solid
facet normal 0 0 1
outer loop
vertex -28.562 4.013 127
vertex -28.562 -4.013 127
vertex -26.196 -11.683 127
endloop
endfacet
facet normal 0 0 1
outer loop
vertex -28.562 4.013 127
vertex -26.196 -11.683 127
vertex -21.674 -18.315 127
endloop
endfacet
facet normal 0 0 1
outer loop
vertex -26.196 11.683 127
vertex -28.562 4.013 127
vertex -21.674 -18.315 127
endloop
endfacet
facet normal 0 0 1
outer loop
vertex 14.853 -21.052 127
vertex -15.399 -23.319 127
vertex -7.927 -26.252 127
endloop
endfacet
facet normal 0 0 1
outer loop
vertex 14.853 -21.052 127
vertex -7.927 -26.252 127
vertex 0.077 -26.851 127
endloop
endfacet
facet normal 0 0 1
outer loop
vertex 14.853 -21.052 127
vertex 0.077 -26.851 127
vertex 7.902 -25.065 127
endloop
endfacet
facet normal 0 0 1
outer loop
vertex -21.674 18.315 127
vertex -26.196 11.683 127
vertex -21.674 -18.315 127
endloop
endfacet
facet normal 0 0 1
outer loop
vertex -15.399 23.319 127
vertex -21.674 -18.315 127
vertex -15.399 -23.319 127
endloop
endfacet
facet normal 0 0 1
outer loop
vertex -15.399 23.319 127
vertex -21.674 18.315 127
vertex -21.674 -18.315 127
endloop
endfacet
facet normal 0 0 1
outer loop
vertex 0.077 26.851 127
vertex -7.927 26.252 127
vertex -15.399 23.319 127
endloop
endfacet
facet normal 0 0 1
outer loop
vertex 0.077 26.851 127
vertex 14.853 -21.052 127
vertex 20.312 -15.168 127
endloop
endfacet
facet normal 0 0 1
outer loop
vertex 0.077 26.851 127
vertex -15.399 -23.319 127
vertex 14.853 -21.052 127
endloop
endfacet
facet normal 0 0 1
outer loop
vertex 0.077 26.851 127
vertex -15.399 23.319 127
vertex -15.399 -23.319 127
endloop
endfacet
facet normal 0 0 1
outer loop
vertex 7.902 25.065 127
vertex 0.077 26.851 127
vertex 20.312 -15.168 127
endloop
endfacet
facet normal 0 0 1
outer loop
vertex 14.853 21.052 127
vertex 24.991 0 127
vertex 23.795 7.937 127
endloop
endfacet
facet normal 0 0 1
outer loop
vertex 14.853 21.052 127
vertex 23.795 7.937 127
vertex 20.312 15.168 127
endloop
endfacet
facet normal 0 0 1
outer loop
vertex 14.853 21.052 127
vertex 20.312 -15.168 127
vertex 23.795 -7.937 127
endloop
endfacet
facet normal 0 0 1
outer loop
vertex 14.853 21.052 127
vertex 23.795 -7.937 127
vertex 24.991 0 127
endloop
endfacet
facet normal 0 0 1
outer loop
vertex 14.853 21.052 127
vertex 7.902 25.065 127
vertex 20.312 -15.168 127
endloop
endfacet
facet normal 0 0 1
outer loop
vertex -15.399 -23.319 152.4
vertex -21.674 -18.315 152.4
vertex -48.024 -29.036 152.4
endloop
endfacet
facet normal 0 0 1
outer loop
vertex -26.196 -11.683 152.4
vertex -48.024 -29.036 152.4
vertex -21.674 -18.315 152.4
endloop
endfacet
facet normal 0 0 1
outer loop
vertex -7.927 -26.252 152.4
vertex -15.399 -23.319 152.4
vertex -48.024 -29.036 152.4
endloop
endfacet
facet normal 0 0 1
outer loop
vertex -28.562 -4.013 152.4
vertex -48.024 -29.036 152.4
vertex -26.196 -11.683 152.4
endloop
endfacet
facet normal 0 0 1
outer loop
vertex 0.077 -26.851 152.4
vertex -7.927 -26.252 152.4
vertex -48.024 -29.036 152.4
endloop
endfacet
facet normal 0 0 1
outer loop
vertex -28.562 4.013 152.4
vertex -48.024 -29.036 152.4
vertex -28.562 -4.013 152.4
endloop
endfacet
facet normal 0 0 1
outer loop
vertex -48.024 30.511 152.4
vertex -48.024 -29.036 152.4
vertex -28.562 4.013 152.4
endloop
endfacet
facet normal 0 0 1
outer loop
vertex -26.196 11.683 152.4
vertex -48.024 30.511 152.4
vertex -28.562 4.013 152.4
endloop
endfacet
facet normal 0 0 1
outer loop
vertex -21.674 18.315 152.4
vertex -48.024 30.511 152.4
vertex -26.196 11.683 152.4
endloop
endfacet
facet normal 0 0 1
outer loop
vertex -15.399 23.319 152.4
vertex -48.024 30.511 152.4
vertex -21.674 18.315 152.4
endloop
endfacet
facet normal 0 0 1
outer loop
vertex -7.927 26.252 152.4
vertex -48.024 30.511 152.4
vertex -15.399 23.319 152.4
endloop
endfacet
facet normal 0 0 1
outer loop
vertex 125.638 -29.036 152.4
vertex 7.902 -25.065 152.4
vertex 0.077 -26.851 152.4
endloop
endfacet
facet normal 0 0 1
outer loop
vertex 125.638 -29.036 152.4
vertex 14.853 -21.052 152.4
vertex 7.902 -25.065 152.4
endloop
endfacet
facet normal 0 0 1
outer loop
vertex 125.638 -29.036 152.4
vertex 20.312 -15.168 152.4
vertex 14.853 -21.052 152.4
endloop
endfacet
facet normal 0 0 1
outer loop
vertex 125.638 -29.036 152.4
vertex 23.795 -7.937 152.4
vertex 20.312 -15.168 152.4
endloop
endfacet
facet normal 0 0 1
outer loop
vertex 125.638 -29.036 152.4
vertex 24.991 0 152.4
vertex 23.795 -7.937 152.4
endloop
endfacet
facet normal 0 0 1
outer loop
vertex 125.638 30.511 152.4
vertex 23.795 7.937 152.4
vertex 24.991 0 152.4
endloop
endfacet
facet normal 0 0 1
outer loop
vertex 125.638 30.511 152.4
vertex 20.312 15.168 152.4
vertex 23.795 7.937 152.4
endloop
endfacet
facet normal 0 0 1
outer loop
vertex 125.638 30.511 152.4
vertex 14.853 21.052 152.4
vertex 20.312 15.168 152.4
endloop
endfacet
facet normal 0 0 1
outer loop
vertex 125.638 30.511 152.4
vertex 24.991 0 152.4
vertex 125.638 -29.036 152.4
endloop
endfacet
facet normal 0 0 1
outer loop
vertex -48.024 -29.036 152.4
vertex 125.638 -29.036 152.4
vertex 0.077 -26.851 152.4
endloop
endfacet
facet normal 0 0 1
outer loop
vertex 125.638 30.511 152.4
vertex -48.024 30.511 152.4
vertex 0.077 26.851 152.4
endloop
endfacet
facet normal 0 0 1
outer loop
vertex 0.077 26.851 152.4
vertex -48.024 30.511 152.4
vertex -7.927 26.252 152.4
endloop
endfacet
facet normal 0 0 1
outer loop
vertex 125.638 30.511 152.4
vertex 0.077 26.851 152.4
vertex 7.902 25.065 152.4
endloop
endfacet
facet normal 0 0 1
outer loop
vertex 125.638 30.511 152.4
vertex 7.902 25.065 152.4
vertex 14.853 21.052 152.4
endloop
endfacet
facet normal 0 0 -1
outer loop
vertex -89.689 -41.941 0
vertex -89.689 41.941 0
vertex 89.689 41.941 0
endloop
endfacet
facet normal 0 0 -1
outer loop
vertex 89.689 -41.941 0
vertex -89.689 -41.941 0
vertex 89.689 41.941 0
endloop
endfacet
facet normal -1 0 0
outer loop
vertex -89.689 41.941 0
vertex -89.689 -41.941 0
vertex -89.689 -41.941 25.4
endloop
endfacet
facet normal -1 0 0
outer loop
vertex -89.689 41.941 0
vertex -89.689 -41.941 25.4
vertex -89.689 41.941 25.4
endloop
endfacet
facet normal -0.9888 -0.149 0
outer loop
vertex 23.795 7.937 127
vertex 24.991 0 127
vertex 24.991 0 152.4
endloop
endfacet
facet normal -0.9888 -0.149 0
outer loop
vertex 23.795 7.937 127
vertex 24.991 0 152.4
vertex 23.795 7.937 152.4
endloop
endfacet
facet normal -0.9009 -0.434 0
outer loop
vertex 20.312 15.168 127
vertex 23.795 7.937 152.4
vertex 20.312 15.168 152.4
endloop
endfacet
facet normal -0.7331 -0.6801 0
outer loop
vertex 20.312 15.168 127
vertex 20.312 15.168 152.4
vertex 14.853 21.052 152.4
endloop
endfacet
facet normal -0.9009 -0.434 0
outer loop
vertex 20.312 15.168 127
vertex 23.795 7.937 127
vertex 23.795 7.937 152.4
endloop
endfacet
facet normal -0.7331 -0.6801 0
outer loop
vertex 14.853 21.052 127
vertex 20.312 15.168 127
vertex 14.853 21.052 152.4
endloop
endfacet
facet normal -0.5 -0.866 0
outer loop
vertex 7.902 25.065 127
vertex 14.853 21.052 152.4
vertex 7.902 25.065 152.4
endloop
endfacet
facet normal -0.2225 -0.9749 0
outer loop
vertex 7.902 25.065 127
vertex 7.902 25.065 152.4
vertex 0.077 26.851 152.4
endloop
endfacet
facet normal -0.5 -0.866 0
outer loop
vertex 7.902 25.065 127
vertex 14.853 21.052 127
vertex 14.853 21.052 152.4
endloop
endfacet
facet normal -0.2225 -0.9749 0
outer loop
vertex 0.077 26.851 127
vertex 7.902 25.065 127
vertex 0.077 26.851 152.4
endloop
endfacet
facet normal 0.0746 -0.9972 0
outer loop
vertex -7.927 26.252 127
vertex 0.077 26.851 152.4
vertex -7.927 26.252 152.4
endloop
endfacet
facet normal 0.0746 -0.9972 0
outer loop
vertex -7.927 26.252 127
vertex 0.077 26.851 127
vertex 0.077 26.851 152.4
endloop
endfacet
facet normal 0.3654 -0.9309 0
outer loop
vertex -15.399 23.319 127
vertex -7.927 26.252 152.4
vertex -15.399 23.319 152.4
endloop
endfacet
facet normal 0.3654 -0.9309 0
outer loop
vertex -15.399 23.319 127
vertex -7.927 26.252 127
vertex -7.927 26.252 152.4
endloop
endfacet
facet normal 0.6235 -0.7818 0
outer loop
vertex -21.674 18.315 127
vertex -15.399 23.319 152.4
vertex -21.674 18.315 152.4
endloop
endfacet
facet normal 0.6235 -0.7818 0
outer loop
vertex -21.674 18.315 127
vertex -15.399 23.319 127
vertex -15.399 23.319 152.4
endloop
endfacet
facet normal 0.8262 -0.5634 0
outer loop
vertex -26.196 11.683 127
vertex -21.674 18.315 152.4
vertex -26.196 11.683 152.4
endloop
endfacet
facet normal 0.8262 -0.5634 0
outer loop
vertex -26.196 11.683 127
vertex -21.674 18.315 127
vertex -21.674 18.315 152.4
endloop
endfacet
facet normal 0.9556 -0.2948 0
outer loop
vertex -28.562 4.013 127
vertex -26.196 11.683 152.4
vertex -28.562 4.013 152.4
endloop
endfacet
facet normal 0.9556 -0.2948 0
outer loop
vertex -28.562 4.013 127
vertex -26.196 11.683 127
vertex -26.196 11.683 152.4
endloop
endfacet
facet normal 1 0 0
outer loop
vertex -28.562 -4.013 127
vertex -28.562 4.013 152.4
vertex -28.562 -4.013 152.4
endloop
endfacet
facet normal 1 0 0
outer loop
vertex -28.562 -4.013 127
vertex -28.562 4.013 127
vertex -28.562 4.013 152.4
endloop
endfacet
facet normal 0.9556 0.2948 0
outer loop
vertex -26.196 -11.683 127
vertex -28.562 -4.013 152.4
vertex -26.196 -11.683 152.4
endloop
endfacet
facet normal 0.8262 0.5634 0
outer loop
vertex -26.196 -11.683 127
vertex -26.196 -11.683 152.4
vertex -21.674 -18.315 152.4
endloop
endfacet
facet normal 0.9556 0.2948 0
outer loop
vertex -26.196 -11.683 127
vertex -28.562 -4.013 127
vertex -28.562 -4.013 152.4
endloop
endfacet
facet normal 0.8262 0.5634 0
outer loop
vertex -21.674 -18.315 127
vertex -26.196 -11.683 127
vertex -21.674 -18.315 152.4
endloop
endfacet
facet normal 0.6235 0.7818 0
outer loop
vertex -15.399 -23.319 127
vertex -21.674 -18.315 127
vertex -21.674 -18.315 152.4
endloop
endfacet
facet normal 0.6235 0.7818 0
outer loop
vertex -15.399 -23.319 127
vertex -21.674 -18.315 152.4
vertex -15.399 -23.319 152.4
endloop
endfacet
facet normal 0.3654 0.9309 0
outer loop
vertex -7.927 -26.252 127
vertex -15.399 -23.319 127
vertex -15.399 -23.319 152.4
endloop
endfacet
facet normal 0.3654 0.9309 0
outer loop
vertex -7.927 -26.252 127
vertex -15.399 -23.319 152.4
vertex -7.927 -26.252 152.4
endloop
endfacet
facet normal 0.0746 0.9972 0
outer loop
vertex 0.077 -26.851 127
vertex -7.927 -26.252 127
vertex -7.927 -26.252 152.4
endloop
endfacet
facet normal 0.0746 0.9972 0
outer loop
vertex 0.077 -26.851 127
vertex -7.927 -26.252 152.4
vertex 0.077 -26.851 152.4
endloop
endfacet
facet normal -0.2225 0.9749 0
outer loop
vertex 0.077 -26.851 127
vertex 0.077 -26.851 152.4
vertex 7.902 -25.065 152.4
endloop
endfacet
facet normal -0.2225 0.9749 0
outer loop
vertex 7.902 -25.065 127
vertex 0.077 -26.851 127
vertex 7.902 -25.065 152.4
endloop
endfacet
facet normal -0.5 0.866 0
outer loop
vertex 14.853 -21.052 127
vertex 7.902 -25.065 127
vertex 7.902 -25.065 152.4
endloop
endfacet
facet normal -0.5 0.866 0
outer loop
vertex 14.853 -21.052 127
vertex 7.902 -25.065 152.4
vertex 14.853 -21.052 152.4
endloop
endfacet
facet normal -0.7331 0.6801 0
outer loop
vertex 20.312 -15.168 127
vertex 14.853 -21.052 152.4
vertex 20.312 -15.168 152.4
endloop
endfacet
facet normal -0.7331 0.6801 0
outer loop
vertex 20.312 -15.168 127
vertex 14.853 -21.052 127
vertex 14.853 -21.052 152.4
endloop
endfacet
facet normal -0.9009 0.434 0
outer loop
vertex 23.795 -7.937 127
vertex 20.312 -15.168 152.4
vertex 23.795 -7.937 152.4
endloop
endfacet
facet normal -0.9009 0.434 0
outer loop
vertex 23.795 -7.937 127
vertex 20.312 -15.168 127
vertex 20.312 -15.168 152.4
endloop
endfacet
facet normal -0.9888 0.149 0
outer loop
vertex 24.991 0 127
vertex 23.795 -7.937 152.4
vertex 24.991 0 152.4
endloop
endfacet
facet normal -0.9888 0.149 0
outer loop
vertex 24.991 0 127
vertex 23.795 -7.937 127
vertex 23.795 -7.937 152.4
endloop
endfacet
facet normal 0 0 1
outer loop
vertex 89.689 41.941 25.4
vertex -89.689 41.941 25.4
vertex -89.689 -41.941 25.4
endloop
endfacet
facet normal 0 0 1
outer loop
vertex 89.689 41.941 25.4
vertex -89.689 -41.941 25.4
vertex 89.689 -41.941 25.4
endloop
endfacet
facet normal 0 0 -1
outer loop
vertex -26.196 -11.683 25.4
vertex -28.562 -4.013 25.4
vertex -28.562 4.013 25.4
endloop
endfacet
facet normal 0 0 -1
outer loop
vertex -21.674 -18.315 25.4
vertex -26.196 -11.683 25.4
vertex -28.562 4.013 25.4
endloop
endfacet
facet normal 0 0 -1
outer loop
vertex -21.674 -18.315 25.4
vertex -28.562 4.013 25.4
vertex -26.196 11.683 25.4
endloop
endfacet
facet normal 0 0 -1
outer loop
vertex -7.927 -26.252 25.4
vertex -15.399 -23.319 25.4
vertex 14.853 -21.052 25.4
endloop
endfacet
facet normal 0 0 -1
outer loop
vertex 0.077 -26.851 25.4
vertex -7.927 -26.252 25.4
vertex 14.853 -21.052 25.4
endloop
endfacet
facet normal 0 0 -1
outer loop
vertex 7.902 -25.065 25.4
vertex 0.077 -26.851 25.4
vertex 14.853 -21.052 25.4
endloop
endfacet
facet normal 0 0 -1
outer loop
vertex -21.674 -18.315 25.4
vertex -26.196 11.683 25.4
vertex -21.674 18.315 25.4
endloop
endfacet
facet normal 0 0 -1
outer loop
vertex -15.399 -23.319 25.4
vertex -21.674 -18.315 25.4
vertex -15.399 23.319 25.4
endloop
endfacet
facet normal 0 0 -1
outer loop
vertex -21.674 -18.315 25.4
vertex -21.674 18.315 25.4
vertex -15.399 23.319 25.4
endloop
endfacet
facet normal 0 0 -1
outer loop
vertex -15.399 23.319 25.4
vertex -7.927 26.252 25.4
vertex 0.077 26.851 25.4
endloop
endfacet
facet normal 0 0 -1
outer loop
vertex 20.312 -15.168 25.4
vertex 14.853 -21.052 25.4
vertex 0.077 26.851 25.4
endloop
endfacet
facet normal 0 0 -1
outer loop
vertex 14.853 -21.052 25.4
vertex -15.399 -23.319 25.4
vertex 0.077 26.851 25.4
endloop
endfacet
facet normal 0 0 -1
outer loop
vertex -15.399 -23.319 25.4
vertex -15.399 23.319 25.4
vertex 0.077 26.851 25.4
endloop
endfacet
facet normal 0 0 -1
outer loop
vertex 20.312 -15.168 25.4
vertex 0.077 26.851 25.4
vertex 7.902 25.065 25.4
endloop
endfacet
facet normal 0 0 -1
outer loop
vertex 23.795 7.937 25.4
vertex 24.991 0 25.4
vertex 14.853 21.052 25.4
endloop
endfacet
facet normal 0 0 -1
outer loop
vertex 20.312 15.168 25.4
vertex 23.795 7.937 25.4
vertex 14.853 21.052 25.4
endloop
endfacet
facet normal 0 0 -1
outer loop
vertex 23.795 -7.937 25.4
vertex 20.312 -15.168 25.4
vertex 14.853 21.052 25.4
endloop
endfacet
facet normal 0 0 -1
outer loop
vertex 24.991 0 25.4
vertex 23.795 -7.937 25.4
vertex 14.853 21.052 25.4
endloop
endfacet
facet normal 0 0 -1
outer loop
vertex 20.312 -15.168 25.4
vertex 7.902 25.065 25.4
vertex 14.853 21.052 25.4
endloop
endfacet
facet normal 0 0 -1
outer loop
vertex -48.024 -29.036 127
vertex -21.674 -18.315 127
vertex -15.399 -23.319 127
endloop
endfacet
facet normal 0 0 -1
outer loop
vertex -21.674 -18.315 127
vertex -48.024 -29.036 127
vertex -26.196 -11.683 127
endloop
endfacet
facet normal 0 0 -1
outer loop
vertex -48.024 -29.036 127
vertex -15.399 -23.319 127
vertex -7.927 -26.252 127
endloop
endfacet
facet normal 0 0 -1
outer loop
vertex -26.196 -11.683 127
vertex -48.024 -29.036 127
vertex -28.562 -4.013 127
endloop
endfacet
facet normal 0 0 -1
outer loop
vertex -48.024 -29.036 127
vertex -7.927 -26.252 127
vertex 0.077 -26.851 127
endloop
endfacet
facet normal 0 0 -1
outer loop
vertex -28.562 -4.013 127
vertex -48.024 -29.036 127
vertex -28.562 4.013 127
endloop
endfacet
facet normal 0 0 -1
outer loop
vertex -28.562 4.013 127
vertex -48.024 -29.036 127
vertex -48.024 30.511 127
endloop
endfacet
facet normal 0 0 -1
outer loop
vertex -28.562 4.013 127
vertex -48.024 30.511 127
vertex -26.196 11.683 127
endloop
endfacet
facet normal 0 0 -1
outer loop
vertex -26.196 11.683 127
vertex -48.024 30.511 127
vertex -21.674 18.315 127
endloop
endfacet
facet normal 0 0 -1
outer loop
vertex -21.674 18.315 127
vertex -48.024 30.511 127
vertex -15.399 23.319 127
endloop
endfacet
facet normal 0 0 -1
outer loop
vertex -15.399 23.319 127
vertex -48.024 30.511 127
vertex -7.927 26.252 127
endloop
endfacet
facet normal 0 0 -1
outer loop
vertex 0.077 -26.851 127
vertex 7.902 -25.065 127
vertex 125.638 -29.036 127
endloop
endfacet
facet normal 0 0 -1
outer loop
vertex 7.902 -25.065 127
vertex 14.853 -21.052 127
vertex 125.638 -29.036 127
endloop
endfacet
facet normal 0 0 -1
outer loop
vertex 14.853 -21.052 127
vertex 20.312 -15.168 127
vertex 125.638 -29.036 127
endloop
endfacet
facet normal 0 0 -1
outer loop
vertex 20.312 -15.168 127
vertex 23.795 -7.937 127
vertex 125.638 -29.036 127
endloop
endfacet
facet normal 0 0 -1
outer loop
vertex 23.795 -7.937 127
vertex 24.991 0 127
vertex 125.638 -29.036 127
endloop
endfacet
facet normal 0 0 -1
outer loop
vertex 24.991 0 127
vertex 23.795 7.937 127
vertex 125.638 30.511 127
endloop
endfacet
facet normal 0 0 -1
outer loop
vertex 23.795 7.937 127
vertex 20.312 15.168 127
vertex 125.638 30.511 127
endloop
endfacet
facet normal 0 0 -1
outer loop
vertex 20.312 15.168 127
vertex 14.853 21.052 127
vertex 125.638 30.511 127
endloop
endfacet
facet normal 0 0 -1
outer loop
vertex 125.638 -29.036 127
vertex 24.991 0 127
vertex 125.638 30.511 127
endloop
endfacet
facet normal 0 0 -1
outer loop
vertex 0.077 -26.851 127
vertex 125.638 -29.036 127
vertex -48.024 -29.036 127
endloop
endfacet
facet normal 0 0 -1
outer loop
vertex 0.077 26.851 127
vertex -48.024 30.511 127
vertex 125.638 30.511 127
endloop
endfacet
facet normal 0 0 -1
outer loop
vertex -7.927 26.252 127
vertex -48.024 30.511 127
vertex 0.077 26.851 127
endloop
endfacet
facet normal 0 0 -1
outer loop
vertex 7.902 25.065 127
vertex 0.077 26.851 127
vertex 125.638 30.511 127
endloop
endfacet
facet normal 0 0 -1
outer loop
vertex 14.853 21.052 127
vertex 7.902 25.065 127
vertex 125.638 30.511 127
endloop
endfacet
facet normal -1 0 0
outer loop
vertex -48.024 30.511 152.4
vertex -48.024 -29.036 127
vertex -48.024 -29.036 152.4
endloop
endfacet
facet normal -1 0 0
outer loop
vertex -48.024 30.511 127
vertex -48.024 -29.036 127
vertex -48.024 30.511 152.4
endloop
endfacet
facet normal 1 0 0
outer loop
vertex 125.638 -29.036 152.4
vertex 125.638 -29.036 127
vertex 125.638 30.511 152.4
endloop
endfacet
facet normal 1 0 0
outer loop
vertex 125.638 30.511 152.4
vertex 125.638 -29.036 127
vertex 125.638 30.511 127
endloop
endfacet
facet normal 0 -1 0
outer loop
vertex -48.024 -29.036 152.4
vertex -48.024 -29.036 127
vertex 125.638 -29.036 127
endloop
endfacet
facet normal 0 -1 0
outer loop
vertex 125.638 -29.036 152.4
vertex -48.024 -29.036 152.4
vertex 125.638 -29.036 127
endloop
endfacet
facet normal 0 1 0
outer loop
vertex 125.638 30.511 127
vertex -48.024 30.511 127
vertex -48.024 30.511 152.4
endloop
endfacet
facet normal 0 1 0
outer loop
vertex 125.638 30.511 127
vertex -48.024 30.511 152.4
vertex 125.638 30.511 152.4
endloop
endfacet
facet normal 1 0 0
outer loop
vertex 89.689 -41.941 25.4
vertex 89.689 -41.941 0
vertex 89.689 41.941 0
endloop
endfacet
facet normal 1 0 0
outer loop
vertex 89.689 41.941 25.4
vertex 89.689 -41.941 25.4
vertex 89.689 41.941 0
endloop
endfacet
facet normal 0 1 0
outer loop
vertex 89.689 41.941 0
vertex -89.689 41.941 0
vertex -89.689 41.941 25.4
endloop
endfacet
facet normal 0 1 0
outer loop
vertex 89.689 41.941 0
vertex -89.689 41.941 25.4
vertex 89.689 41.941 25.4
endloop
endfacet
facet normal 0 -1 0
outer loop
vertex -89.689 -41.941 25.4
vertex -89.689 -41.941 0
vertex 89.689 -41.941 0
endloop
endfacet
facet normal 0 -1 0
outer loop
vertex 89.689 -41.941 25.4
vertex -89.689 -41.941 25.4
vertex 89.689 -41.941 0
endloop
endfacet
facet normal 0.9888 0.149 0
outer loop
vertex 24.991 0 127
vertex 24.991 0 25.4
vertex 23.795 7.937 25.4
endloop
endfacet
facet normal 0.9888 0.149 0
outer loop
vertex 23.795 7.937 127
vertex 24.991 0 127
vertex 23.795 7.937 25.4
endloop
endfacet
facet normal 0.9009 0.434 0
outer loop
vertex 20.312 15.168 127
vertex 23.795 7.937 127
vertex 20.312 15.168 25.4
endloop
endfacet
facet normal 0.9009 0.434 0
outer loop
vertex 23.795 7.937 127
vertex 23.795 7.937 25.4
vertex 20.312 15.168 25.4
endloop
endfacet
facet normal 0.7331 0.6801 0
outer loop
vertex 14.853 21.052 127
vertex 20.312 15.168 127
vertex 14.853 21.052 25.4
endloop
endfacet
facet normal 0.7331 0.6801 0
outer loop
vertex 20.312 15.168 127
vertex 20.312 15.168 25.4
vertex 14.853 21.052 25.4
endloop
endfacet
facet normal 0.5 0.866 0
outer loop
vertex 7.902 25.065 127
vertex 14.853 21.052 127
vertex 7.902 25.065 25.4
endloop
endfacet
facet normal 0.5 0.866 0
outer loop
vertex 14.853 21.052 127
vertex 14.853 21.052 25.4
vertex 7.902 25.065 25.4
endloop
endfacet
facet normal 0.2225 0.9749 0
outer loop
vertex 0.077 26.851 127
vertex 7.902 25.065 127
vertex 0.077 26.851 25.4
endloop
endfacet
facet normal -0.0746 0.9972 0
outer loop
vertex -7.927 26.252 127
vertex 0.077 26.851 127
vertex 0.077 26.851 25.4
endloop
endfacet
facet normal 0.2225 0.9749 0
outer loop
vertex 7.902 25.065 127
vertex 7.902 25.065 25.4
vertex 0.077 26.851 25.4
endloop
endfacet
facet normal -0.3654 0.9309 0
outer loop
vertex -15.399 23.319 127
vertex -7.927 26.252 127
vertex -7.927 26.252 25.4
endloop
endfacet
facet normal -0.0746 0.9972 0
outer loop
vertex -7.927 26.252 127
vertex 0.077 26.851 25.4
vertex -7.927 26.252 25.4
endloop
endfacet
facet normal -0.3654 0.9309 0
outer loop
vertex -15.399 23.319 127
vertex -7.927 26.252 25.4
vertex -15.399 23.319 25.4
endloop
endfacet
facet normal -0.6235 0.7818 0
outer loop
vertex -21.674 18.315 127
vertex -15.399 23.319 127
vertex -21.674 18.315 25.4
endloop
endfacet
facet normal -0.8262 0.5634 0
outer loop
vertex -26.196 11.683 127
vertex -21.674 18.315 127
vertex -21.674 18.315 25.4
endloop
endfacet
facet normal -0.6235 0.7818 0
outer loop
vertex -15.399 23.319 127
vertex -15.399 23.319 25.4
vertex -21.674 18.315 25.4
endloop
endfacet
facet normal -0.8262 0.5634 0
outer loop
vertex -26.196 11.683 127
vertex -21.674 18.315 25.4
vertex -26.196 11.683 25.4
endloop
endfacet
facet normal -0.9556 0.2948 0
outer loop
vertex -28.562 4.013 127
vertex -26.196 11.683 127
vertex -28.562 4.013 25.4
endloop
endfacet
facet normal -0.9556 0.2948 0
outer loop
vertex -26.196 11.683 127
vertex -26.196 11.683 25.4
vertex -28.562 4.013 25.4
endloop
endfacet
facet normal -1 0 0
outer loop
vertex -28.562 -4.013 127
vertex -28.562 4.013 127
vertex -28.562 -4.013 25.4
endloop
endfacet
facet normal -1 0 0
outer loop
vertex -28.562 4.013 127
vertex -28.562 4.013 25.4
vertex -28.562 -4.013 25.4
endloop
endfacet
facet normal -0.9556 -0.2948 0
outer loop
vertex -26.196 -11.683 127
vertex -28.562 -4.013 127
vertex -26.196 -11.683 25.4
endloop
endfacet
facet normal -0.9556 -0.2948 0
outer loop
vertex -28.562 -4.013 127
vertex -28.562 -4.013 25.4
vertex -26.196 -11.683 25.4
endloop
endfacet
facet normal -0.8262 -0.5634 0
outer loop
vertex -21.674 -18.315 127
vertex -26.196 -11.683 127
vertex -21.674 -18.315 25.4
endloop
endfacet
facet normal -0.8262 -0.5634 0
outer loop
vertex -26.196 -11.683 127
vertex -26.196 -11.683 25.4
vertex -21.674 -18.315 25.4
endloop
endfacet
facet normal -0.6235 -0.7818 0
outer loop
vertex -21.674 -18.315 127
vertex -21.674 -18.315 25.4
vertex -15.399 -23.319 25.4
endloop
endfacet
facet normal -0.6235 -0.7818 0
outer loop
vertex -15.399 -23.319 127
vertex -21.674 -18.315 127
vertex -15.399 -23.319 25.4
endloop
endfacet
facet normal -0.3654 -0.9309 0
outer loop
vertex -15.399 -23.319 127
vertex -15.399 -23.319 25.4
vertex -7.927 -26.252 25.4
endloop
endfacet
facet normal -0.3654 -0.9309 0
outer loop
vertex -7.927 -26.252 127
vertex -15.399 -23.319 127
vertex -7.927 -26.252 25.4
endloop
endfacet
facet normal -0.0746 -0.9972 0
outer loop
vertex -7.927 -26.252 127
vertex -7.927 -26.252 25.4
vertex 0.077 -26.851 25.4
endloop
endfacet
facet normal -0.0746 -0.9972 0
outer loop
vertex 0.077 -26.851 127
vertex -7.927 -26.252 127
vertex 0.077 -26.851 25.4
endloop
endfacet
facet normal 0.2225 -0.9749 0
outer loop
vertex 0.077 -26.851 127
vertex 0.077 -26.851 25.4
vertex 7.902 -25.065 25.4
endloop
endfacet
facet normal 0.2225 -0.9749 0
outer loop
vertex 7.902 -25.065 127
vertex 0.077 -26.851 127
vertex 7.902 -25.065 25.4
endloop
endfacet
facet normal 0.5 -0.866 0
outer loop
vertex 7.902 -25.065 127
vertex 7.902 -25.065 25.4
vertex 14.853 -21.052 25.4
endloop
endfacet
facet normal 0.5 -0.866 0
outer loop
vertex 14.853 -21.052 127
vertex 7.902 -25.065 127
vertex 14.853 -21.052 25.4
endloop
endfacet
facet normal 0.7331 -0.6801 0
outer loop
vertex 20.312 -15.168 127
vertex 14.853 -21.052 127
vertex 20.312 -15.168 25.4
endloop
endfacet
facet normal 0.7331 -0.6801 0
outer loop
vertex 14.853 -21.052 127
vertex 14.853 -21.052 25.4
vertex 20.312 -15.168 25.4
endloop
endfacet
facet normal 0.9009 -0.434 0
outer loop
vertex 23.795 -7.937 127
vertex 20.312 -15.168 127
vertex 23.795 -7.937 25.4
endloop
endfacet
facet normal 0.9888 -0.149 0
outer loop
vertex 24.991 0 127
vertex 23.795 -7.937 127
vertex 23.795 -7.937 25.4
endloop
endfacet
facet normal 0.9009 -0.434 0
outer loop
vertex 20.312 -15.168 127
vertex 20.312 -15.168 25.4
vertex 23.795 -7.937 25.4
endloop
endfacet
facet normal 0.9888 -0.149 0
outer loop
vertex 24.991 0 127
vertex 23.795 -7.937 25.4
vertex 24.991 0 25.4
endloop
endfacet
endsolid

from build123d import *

# Parameters (mm, degrees)
F0_W     = 179.377258
F0_H     = 83.881452
F1_DEPTH = 25.4
F2_R     = 26.926696
F3_DEPTH = 101.6
F4_W     = 173.662249
F4_H     = 59.546614
F4_R     = 26.926696
F5_DEPTH = 25.4


with BuildPart() as f1:
    # F0 (on Top) → F1 (new body)
    with BuildSketch(Plane.XY):
        Rectangle(F0_W, F0_H)
    extrude(amount=F1_DEPTH)


with BuildPart() as f3:
    # F2 (on face) → F3 (new body)
    with BuildSketch(Plane.XY.offset(25.4)):
        with Locations((-1.935726, 0)):
            Circle(F2_R)
    extrude(amount=F3_DEPTH)


with BuildPart() as f5:
    # F4 (on face) → F5 (new body)
    with BuildSketch(Plane.XY.offset(127)):
        with Locations((38.806689, 0.737418)):
            Rectangle(F4_W, F4_H)
        with Locations((-1.935726, 0)):
            Circle(F4_R, mode=Mode.SUBTRACT)
    extrude(amount=F5_DEPTH)


solid = Compound([f1.part, f3.part, f5.part])
